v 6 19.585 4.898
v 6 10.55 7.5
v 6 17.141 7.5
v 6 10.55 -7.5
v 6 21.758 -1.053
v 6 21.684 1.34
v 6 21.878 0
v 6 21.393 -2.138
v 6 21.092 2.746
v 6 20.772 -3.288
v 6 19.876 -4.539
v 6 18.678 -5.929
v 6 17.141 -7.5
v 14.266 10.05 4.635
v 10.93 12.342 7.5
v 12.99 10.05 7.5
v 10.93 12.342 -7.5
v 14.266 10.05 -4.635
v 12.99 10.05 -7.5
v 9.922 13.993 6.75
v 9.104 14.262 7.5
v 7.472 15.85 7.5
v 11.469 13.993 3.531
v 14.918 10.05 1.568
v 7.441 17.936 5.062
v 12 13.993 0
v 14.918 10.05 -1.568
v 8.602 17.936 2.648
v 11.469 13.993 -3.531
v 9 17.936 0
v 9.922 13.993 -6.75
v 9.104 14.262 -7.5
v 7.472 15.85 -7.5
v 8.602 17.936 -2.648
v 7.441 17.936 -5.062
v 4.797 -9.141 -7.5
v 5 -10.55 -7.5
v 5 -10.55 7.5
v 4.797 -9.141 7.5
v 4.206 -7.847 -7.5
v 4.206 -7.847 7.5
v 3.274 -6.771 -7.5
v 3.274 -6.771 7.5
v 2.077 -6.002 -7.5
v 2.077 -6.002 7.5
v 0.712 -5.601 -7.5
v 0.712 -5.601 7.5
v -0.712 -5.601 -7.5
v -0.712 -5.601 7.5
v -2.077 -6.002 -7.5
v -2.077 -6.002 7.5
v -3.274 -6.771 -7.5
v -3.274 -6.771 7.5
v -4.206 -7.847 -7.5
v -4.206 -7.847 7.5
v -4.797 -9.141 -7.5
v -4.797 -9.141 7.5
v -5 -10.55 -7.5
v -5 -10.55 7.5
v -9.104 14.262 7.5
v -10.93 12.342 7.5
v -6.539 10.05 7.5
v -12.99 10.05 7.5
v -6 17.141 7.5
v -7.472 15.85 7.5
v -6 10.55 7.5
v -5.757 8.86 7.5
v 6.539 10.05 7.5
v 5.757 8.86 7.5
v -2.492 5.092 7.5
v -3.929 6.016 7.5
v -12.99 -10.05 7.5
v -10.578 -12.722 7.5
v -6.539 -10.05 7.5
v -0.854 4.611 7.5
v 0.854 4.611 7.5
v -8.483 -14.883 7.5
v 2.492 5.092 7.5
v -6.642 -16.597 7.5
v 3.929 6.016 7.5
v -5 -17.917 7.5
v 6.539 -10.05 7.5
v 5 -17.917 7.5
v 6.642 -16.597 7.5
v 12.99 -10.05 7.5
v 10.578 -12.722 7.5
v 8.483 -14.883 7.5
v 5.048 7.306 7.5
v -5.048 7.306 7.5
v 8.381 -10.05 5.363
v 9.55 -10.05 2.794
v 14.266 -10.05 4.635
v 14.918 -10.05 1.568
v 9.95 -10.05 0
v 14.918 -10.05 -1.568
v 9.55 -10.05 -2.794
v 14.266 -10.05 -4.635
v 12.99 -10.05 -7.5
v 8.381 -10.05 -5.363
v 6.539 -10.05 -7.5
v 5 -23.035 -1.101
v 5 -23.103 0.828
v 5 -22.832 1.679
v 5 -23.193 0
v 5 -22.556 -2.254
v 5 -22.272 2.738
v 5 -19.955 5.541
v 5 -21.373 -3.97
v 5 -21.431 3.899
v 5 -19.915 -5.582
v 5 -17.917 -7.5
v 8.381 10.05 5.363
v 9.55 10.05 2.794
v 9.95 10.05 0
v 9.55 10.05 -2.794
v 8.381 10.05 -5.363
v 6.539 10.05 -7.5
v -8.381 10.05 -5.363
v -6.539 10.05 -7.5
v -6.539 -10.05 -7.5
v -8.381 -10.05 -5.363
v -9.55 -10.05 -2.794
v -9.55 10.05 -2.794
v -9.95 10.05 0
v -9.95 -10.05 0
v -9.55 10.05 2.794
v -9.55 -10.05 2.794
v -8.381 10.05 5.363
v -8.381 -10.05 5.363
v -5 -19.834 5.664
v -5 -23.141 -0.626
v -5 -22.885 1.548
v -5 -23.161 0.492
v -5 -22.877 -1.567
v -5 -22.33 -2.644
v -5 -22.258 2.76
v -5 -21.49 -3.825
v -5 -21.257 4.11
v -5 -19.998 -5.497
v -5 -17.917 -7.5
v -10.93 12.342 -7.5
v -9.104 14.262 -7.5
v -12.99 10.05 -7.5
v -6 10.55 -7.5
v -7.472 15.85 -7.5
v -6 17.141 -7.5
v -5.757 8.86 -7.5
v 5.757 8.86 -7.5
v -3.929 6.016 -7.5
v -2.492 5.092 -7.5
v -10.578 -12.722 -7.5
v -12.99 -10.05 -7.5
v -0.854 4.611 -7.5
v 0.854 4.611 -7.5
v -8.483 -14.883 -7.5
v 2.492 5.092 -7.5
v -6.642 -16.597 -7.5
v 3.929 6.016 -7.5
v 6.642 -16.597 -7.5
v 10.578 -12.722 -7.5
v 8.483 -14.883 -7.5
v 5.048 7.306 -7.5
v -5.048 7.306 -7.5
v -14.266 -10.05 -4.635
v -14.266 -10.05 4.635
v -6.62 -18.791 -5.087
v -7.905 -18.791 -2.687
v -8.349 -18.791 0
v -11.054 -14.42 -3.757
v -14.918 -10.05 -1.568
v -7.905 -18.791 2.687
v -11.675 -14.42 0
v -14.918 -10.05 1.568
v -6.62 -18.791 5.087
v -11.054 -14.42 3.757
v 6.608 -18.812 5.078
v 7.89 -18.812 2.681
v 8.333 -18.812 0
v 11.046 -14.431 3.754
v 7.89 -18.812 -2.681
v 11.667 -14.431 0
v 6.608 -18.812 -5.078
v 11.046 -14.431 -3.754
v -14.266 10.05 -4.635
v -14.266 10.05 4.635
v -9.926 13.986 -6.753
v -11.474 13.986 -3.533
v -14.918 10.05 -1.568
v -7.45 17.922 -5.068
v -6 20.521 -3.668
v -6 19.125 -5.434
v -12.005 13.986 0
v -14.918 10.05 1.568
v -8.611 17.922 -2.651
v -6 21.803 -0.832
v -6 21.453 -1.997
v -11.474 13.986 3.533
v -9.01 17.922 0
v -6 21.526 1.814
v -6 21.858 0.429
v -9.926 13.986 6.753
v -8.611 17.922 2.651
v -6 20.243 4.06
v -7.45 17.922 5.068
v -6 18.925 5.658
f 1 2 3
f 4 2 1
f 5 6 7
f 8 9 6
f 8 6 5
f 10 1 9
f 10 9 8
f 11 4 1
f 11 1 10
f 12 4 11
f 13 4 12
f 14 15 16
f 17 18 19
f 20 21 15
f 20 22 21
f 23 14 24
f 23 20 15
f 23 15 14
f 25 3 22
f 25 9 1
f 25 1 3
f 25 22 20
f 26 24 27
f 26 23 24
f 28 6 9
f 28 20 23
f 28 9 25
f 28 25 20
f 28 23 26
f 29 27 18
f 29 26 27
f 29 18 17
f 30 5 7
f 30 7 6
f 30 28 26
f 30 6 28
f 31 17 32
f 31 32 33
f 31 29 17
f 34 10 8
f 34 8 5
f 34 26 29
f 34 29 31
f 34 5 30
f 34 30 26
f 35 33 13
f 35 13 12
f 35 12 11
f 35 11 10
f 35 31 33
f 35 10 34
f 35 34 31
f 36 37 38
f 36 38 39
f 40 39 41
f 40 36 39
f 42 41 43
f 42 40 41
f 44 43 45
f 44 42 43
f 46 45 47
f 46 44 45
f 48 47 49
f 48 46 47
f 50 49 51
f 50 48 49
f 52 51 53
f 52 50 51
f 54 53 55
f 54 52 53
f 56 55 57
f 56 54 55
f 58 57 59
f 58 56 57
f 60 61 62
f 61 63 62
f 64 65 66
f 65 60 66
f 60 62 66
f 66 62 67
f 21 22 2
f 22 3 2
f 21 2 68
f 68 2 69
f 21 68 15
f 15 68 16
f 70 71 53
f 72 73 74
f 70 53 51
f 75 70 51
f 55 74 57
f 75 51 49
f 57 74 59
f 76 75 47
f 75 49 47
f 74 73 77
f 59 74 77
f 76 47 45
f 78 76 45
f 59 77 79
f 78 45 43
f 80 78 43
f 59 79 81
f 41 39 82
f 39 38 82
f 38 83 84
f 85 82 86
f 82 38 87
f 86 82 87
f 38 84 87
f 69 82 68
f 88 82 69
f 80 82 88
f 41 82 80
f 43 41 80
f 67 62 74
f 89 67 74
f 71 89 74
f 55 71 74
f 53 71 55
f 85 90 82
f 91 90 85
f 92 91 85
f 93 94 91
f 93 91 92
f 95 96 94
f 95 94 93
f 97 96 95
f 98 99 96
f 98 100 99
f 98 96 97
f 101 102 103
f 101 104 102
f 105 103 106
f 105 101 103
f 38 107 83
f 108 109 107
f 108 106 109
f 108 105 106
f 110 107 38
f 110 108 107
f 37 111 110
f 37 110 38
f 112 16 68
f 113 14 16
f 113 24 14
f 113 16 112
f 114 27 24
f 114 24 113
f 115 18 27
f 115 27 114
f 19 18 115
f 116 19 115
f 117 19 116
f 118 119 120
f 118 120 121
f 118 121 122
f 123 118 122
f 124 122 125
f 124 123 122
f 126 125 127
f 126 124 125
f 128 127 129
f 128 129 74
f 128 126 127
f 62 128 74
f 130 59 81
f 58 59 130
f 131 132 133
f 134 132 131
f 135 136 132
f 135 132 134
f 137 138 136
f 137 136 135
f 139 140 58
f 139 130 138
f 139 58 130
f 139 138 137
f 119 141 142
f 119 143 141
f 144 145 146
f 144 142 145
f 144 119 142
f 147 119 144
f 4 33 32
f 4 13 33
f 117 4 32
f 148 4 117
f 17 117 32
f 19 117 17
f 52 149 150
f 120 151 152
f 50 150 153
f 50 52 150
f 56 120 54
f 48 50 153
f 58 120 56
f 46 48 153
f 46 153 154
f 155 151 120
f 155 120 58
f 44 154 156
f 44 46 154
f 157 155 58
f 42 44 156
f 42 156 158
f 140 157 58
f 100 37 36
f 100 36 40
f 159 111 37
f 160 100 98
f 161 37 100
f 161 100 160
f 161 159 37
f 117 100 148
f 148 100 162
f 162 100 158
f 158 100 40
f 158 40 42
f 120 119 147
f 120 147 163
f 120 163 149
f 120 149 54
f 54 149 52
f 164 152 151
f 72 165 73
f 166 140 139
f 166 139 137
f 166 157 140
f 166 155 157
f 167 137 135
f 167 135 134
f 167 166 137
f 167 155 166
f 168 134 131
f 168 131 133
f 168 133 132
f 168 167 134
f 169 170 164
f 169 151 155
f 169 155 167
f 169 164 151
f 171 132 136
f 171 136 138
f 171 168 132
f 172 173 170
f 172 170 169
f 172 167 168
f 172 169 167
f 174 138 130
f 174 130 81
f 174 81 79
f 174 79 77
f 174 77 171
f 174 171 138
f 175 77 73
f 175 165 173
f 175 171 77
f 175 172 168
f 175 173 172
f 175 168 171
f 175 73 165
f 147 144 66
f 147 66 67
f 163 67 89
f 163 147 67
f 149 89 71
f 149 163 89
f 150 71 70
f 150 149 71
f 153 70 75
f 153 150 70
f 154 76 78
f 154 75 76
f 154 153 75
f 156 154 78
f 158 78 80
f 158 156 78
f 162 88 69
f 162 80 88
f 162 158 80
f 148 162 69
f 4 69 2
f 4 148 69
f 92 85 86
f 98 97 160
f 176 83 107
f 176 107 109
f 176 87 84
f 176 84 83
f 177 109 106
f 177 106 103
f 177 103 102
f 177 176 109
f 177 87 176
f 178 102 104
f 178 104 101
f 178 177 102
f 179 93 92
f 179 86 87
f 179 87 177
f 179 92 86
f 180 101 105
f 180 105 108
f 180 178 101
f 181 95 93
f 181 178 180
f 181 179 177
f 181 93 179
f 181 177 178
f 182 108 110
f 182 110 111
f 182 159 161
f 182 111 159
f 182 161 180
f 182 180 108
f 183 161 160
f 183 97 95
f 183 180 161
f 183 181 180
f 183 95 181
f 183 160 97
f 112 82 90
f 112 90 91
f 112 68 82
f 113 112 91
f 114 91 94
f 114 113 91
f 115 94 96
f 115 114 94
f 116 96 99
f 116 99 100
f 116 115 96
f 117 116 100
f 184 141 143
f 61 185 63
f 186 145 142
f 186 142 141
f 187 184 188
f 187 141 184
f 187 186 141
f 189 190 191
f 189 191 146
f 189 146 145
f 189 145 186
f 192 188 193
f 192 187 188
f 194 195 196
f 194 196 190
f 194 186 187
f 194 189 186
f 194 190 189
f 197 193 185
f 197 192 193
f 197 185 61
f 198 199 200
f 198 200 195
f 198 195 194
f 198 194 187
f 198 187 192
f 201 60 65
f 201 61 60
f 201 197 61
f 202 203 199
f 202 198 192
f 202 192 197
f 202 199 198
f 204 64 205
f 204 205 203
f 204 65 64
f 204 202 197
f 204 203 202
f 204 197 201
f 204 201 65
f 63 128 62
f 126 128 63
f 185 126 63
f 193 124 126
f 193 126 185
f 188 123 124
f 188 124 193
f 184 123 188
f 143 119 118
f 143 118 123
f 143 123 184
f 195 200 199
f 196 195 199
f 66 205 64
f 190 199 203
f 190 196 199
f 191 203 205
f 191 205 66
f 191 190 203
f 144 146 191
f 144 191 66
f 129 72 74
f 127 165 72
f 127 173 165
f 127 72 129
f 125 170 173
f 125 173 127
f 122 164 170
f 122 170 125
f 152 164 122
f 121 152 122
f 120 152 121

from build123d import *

# Parameters (mm, degrees)
ESBO_O2_OUTSIDE_W          = 45.13
ESBO_O2_OUTSIDE_H          = 45.13
ESBO_O2_OUTSIDE_W_2        = 30
ESBO_O2_OUTSIDE_H_2        = 15
CORTE_EXTRUS_O1_DEPTH      = 26.05
CORTE_EXTRUS_O1_DEPTH_BACK = 26.05
CORTE_EXTRUS_O2_DEPTH      = 16


with BuildPart() as part:
    # Esboço1 one side → Revolução1 (revolve)
    with BuildSketch(Plane.XY):
        with BuildLine():
            ThreePointArc((4, 24.506832295), (2.018355219, 24.913587797), (0, 25.05))
            Line((0, 25.05), (0, -25.05))
            ThreePointArc((0, -25.05), (2.018355219, -24.913587797), (4, -24.506832295))
            Line((4, -24.506832295), (15, -10.05))
            Line((15, -10.05), (9.95, -10.05))
            Line((9.95, -10.05), (9.95, 10.05))
            Line((9.95, 10.05), (15, 10.05))
            Line((15, 10.05), (4, 24.506832295))
        make_face()
    revolve(axis=Axis((0, -25.05, 0), (0, 1, 0)))

    # Esboço2 outside → Corte-extrusão1 (cut, two sides)
    with BuildSketch(Plane(origin=(0, 0, 0), x_dir=(1, 0, 0), z_dir=(0, 1, 0))) as corte_extrus_o1_sk:
        Rectangle(ESBO_O2_OUTSIDE_W, ESBO_O2_OUTSIDE_H)
        Rectangle(ESBO_O2_OUTSIDE_W_2, ESBO_O2_OUTSIDE_H_2, mode=Mode.SUBTRACT)
    extrude(amount=CORTE_EXTRUS_O1_DEPTH, mode=Mode.SUBTRACT)
    extrude(corte_extrus_o1_sk.sketch, amount=-CORTE_EXTRUS_O1_DEPTH_BACK, mode=Mode.SUBTRACT)

    # Esboço3 → Corte-extrusão2 (cut, through all)
    with BuildSketch(Plane(origin=(0, 0, -7.5), x_dir=(-1, 0, 0), z_dir=(0, 0, -1))):
        with BuildLine():
            Line((6, 25.05), (6, 10.55))
            ThreePointArc((6, 10.55), (0, 4.55), (-6, 10.55))
            Line((-6, 10.55), (-6, 25.05))
            ThreePointArc((-6, 25.05), (0, 31.05), (6, 25.05))
        make_face()
        with BuildLine():
            Line((-5, -25.05), (-5, -10.55))
            ThreePointArc((-5, -10.55), (0, -5.55), (5, -10.55))
            Line((5, -10.55), (5, -25.05))
            ThreePointArc((5, -25.05), (0, -30.05), (-5, -25.05))
        make_face()
    extrude(amount=-CORTE_EXTRUS_O2_DEPTH, mode=Mode.SUBTRACT)


solid = part.part
